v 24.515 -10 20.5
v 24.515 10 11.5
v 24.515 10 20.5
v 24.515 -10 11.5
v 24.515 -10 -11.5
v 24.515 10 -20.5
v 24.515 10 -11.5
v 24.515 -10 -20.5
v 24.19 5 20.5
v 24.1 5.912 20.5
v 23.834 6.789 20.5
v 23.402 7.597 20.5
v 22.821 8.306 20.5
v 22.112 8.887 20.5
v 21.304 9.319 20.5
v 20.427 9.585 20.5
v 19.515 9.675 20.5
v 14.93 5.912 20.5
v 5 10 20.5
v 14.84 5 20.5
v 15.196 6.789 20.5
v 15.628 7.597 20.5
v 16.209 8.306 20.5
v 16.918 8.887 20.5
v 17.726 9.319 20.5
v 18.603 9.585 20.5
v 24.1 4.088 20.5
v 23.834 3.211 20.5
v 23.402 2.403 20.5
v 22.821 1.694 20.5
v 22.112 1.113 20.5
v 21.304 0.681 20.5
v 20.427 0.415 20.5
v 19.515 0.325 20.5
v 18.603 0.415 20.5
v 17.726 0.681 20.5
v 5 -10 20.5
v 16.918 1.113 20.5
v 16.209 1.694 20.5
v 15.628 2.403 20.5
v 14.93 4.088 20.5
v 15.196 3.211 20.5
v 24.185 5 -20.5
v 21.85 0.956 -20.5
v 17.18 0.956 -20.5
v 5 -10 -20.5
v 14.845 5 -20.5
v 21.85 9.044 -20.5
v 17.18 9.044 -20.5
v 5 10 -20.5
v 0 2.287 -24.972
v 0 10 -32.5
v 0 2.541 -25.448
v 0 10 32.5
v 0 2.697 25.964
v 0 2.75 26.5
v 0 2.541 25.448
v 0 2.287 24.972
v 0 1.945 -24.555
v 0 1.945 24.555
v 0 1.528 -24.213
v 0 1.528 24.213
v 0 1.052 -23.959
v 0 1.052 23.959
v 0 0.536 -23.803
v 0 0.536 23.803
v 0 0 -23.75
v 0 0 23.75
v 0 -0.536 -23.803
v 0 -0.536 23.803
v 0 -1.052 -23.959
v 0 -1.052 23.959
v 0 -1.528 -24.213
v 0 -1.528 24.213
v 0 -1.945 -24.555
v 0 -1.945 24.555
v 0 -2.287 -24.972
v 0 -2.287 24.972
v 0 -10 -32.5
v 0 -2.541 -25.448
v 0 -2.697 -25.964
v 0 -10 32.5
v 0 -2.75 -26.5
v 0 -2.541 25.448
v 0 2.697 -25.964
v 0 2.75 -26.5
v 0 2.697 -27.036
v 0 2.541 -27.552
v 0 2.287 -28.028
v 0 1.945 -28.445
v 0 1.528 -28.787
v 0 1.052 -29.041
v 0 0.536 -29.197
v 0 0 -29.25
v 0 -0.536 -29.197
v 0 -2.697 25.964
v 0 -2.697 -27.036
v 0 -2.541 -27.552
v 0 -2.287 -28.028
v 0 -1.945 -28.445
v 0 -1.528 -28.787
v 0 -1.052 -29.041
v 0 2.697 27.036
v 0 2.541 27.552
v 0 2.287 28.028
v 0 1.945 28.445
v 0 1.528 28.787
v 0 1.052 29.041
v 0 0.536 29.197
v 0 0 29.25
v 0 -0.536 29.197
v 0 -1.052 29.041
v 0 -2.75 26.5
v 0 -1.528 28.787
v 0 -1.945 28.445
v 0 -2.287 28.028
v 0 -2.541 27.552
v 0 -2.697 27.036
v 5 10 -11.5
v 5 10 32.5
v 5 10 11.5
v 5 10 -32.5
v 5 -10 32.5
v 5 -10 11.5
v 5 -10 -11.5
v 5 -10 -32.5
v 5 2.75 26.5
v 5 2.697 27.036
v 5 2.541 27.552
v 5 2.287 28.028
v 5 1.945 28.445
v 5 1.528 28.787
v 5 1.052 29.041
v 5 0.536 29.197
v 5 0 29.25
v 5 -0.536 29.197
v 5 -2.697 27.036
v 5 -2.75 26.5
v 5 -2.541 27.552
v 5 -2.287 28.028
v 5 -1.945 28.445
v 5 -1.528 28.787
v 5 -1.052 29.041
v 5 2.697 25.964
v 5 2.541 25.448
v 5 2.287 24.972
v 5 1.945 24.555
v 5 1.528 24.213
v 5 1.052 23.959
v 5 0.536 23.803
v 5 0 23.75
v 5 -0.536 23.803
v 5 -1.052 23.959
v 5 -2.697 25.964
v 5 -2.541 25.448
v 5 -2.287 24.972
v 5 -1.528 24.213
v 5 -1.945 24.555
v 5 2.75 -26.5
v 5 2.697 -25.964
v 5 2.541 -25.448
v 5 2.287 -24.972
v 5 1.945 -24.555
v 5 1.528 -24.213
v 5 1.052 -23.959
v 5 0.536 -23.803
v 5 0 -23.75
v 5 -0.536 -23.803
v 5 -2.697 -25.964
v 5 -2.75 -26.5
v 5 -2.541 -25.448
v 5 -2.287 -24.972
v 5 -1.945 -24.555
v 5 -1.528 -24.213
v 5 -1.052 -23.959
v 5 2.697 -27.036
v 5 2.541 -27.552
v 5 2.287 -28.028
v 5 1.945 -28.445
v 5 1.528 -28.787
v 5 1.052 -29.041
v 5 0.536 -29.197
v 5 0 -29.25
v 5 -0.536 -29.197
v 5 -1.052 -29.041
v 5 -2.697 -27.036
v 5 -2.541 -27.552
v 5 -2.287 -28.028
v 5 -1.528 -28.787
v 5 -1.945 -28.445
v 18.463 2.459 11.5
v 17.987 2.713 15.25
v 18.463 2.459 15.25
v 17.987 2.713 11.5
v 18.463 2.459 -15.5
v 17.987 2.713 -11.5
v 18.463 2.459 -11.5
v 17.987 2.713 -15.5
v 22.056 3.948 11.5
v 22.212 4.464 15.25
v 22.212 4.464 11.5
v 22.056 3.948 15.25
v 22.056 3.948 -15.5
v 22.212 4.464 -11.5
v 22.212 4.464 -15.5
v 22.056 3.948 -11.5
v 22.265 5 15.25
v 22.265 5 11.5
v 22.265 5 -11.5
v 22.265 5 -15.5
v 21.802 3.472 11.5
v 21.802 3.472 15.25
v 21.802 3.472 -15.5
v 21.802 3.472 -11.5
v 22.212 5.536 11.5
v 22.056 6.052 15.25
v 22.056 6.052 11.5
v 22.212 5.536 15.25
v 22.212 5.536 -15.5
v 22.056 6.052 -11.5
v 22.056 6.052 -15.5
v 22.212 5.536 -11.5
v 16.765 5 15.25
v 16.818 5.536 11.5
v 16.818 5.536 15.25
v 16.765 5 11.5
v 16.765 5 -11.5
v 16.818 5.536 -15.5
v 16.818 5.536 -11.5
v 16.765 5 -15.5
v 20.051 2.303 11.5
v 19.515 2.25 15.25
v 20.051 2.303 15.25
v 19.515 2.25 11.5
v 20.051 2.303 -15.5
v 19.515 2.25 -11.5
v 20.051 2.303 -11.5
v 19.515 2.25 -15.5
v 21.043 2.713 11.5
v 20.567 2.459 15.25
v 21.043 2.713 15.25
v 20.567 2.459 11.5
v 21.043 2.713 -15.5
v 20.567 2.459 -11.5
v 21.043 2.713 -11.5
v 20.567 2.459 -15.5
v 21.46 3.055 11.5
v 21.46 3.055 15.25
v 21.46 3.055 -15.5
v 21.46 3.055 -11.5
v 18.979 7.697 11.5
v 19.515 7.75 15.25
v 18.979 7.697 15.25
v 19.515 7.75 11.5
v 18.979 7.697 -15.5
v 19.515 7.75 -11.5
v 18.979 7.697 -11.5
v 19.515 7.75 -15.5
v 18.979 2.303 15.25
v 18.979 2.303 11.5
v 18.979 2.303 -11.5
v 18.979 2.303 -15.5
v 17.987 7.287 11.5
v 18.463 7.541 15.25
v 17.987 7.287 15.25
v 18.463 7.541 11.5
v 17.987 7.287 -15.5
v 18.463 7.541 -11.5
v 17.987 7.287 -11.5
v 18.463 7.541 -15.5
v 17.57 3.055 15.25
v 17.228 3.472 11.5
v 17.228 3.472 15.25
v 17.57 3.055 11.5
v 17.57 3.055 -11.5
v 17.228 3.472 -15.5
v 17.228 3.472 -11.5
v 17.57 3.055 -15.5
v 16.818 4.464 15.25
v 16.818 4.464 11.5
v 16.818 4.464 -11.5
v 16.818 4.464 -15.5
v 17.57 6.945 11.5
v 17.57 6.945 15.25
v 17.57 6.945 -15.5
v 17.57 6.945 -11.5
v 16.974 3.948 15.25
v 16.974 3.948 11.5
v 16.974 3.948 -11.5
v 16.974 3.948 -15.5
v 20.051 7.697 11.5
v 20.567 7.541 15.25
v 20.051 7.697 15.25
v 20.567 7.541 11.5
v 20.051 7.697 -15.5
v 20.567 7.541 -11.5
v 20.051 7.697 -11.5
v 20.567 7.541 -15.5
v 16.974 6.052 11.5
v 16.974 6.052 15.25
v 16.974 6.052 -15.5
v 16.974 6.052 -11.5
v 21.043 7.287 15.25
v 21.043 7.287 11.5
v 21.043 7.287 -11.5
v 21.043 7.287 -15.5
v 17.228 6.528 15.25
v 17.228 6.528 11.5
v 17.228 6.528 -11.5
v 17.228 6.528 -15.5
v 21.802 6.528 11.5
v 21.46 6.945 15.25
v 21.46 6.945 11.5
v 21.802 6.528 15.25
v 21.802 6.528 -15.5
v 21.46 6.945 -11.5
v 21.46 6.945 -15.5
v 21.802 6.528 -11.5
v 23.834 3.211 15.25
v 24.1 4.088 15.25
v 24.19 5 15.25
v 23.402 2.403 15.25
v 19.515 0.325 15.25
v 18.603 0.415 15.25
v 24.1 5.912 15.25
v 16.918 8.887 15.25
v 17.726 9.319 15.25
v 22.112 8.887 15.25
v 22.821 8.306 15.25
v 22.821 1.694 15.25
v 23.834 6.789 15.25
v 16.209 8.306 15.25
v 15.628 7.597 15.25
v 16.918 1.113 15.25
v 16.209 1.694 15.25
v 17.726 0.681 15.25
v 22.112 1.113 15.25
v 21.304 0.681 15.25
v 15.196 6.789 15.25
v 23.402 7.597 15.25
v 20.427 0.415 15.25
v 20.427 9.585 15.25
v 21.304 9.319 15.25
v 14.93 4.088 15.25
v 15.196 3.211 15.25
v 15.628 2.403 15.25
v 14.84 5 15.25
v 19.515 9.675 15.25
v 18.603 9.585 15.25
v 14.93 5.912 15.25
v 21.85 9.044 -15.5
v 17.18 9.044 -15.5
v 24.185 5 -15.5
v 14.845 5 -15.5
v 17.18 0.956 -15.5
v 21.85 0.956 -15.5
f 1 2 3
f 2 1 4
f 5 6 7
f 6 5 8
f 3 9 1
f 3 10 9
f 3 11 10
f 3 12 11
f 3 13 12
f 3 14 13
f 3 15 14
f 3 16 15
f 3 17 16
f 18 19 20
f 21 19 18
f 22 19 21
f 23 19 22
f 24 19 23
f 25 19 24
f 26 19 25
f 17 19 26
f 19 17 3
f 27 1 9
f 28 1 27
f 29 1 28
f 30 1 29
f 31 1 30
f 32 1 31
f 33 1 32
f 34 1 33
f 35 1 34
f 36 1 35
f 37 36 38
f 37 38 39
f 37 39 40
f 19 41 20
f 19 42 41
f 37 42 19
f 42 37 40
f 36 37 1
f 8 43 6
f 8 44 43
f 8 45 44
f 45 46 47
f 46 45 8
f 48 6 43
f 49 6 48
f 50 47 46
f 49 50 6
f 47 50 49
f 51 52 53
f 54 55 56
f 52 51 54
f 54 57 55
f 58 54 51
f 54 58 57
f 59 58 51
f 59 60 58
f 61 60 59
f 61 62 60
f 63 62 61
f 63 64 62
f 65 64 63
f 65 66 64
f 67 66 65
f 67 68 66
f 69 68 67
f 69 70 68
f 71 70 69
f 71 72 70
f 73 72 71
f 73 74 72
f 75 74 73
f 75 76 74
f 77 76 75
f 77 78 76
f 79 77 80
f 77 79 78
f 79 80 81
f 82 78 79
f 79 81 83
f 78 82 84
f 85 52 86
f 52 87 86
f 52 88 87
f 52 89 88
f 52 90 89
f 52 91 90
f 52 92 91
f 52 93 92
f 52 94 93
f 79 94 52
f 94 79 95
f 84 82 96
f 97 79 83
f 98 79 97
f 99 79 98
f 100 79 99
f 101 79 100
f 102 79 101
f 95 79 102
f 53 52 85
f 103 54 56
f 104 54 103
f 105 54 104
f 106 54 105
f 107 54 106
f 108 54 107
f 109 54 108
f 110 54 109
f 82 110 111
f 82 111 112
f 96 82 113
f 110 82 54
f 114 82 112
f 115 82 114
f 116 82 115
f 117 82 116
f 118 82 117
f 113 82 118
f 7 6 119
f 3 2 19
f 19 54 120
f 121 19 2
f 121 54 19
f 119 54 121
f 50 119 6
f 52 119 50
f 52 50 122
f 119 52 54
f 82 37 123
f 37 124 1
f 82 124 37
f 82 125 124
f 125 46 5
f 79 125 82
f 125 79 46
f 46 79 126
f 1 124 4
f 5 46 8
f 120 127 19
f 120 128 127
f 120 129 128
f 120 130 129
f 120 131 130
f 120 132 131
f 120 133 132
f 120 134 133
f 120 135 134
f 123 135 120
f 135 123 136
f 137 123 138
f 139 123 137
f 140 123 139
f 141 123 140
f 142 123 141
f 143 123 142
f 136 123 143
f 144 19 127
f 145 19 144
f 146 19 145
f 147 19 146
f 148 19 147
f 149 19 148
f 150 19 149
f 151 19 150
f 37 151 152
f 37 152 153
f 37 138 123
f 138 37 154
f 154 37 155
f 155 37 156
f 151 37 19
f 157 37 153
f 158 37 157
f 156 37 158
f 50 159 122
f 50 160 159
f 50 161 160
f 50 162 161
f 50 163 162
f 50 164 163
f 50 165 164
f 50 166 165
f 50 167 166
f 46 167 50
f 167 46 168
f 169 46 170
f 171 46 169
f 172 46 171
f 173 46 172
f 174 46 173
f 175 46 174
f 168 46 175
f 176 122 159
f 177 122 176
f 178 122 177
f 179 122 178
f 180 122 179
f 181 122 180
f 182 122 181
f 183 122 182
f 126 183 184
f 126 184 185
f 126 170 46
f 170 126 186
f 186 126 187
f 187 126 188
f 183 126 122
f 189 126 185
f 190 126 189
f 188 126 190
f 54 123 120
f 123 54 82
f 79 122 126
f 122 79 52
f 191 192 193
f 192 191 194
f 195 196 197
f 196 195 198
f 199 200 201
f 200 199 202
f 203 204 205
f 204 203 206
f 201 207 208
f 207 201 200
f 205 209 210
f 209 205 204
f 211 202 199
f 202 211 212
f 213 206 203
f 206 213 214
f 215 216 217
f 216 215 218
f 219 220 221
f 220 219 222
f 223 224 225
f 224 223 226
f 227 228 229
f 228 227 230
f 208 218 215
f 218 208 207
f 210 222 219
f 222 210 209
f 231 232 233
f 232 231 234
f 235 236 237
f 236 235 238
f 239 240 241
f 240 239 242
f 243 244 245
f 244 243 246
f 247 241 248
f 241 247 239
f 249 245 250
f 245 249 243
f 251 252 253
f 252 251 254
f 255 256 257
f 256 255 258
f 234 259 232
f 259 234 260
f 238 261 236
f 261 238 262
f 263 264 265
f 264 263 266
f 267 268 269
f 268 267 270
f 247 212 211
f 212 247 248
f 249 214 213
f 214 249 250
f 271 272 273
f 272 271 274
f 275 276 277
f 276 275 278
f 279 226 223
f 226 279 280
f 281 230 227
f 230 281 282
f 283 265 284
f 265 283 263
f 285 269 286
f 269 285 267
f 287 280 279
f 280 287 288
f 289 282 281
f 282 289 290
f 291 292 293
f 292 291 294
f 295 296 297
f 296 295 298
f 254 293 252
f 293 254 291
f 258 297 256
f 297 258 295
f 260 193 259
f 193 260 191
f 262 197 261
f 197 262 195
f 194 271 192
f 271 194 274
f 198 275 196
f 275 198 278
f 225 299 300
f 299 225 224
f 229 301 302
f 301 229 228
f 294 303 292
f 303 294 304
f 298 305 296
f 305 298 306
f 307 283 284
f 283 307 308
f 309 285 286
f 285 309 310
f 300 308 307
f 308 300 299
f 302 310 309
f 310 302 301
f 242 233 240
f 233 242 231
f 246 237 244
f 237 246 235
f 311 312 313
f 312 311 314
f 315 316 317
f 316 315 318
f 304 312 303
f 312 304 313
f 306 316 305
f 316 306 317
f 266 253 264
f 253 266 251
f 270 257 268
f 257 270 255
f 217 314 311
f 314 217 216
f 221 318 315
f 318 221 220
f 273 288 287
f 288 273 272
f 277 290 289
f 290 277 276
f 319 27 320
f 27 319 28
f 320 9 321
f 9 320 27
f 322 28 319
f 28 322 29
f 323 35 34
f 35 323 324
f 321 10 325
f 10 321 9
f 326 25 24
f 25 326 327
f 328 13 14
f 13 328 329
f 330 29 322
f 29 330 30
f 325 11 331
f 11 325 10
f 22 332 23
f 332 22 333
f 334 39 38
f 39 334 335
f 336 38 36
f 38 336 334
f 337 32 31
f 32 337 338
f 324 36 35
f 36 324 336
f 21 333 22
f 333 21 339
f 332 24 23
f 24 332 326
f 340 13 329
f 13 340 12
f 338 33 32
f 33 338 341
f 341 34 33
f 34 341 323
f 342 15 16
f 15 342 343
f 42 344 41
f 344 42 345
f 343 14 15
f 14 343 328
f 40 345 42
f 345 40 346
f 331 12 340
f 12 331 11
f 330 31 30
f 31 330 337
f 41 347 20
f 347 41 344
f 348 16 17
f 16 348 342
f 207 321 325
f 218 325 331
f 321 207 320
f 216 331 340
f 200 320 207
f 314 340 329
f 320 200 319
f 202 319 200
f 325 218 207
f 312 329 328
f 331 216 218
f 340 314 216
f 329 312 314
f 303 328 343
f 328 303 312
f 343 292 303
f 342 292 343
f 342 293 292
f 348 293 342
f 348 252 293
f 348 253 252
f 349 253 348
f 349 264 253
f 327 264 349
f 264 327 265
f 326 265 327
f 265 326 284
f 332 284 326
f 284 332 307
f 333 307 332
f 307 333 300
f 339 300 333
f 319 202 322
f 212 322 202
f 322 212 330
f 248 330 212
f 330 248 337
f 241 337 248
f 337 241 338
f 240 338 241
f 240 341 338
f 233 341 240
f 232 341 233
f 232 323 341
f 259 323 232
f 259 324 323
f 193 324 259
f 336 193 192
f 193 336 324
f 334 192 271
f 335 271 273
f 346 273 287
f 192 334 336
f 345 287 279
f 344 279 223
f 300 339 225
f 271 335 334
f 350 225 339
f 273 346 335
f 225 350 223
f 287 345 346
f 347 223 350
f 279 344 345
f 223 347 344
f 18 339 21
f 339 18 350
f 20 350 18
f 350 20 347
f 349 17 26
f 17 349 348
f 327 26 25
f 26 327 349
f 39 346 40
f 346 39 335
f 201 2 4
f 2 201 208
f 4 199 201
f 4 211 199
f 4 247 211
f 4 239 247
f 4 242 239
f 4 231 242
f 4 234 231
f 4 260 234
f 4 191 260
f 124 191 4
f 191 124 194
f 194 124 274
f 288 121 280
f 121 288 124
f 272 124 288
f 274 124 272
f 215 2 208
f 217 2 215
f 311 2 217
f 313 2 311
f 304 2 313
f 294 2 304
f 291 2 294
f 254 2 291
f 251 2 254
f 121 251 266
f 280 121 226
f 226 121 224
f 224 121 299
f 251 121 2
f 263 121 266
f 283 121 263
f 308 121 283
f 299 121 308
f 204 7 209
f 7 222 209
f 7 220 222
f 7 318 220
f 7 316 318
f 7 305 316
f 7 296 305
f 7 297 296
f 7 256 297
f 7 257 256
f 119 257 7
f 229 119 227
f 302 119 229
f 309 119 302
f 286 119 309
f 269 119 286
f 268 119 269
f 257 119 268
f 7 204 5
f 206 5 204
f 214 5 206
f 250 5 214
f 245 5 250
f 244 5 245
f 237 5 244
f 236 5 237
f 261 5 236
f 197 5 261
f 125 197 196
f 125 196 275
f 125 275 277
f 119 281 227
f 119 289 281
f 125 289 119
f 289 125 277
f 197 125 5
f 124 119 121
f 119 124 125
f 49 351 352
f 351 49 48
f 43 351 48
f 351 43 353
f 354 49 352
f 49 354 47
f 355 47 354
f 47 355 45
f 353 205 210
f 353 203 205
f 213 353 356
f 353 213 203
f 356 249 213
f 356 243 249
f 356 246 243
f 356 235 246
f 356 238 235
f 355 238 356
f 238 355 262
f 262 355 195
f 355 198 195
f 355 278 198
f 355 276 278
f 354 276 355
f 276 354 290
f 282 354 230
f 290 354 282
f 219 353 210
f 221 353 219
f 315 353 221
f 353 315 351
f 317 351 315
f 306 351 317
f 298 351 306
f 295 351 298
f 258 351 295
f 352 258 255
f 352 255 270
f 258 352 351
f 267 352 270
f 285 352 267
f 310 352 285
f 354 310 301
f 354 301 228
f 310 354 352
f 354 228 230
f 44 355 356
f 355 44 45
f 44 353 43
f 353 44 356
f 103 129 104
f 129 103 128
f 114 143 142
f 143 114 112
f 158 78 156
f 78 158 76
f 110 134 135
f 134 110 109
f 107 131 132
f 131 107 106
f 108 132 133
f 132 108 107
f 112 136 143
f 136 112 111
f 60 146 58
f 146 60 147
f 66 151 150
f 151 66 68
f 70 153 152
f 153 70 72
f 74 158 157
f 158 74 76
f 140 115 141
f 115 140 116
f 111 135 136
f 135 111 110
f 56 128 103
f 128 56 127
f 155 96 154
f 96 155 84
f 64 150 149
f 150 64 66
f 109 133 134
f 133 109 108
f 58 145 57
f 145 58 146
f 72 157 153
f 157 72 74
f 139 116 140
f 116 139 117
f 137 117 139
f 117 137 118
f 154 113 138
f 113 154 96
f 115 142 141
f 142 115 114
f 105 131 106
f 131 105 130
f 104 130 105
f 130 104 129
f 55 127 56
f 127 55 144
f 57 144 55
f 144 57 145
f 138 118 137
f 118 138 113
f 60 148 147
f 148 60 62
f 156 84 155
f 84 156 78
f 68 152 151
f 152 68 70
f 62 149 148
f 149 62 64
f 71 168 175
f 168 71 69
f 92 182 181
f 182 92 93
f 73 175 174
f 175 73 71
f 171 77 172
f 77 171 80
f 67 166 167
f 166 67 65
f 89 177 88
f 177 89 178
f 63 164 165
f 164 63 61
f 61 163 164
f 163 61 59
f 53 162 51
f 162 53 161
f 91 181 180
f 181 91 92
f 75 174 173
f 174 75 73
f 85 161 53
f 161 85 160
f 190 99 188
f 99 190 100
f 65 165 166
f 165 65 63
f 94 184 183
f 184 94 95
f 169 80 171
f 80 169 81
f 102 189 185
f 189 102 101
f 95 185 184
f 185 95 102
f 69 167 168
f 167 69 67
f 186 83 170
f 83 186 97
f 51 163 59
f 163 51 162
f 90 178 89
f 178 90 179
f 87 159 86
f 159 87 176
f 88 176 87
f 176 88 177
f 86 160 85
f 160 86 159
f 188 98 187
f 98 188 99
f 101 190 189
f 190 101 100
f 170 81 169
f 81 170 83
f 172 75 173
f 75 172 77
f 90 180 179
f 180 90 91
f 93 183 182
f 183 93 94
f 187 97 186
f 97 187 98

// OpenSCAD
// file: ../library.scad
module lm8uu (shaft_length=100) {
  d = 15.5;
  l = 24+1;
  cylinder(d=8+4, h=shaft_length, center=true);
  cylinder(d=d, h=l, center=true);
}

module lm8uu_zip_tie (thickness, width) {
  d = 15.5;
  cylinder(d=15.5+thickness*2, h=width, center=true);
  translate([0,0+(d+thickness)/2,0]) cube([100,thickness,width], center=true);
  translate([0,0-(d+thickness)/2,0]) cube([100,thickness,width], center=true);
}

module m3_mounting_hole(use_insert_nuts=false) {
  if (!use_insert_nuts) {
    translate([0, 0, 0]) rotate([90,0,0]) cylinder(d=3+0.5, h=8);
    slot_width = 5.5+0.6;
    slot_depth = 2.4+0.6;
    translate([0, -2-(slot_depth)/2, 0]) cube([slot_width,slot_depth,100], center=true);
  } else {
    translate([0, 0 + 2.5 - 5, 0]) rotate([90,0,0]) cylinder(d=4, h=5, center=true);
  }
}

function screw_head_diameter(screw_diameter) = lookup(screw_diameter, [
   [1.4, 2.6],
   [1.6, 3],
   [2.0, 3.8],
   [2.5, 4.5],
   [3.0, 5.5],
   [4.0, 7],
   [5.0, 8.5],
   [6.0, 10],
   [8.0, 13],
   [ 10, 16],
   [ 12, 18],
   [ 14, 21],
   [ 16, 24],
   [ 18, 27],
   [ 20, 30]
 ]);

// scale allows for better fit of screw in hole
// seperation avoids overhands when printing screw hole with head at bottom
module screw (d, l, head=true, scale=1.1, separation=0) { 
  half_scale = (1+(scale-1)/2);
  cylinder(h=l, d=d*scale, center=false);
  if (head) {translate([0,0,-d*half_scale]) cylinder(
    d=screw_head_diameter(d)*scale,
    h=d*scale-separation
  );}
}

module GT2_tooth(h) {
  extra_width = 0.5;
  translate([-1,-0.5-extra_width,0]) cube([2,0.5+extra_width,h]);
  linear_extrude(height=h) polygon([[0.747183,-0.5],[0.747183,0],[0.647876,0.037218],[0.598311,0.130528],[0.578556,0.238423],[0.547158,0.343077],[0.504649,0.443762],[0.451556,0.53975],[0.358229,0.636924],[0.2484,0.707276],[0.127259,0.750044],[0,0.76447],[-0.127259,0.750044],[-0.2484,0.707276],[-0.358229,0.636924],[-0.451556,0.53975],[-0.504797,0.443762],[-0.547291,0.343077],[-0.578605,0.238423],[-0.598311,0.130528],[-0.648009,0.037218],[-0.747183,0],[-0.747183,-0.5]]);
}

module nema17(height, screw_mask_height=0, screw_mask_slot_length=0, center_mask_height=2.5) {
  difference() {
    translate([0,0,-height/2]) hull() {
      cube([42.3, 31, height], center=true);
      cube([31, 42.3, height], center=true);
    }
    translate([31/2,31/2,-4.5]) cylinder(h=9,d=3);
    translate([31/2,-31/2,-4.5]) cylinder(h=9,d=3);
    translate([-31/2,31/2,-4.5]) cylinder(h=9,d=3);
    translate([-31/2,-31/2,-4.5]) cylinder(h=9,d=3);
  }
  cylinder(h=center_mask_height, d=22+2);
  cylinder(h=27, d=5+2);
    
  screw_slot( 31/2, 31/2);
  screw_slot( 31/2,-31/2);
  screw_slot(-31/2, 31/2);
  screw_slot(-31/2,-31/2);
  
  module screw_slot(x, y) { hull() {
    dx = x > 0 ? screw_mask_slot_length/2 : -screw_mask_slot_length/2;
    dy = y > 0 ? screw_mask_slot_length/2 : -screw_mask_slot_length/2;
    translate([x+dx,y+dy,screw_mask_height]) rotate([180,0,0]) screw(d=3, l=screw_mask_height, d=3, head=false);
    translate([x-dx,y-dy,screw_mask_height]) rotate([180,0,0]) screw(d=3, l=screw_mask_height, d=3, head=false);
  }}
}
// main file
$fn=32;
use <../library.scad>;

nema17_width = 42.3;
GT2_pulley_diameter = 12.73;
ALU_width = 20;
GT2_thickness = 2;
crowned_pulley_diameter = 20;

screw_x = nema17_width/2 + GT2_pulley_diameter/2 - ALU_width + GT2_thickness + crowned_pulley_diameter/2;
size_x = screw_x + 5;
screw_y = ALU_width - 5;

difference() {
  union() {
    translate([size_x/2,0,0]) cube([size_x,ALU_width,41], center=true);
    translate([5/2,0,0]) cube([5,20,65], center=true);
  }
  translate([100/2+5,0,0]) cube([100,100,2*10+3], center=true);
  translate([screw_x,screw_y-ALU_width/2,41/2-5]) rotate([180,0,0]) screw(d=5, l=41);
  translate([screw_x,screw_y-ALU_width/2,-41/2]) cylinder(h=5, d=9.24+0.1, $fn=6); // nut

  translate([10,0, (65+41)/4]) rotate([0,-90,0]) screw(d=5, l=10, head=false);
  translate([10,0,-(65+41)/4]) rotate([0,-90,0]) screw(d=5, l=10, head=false);
}
